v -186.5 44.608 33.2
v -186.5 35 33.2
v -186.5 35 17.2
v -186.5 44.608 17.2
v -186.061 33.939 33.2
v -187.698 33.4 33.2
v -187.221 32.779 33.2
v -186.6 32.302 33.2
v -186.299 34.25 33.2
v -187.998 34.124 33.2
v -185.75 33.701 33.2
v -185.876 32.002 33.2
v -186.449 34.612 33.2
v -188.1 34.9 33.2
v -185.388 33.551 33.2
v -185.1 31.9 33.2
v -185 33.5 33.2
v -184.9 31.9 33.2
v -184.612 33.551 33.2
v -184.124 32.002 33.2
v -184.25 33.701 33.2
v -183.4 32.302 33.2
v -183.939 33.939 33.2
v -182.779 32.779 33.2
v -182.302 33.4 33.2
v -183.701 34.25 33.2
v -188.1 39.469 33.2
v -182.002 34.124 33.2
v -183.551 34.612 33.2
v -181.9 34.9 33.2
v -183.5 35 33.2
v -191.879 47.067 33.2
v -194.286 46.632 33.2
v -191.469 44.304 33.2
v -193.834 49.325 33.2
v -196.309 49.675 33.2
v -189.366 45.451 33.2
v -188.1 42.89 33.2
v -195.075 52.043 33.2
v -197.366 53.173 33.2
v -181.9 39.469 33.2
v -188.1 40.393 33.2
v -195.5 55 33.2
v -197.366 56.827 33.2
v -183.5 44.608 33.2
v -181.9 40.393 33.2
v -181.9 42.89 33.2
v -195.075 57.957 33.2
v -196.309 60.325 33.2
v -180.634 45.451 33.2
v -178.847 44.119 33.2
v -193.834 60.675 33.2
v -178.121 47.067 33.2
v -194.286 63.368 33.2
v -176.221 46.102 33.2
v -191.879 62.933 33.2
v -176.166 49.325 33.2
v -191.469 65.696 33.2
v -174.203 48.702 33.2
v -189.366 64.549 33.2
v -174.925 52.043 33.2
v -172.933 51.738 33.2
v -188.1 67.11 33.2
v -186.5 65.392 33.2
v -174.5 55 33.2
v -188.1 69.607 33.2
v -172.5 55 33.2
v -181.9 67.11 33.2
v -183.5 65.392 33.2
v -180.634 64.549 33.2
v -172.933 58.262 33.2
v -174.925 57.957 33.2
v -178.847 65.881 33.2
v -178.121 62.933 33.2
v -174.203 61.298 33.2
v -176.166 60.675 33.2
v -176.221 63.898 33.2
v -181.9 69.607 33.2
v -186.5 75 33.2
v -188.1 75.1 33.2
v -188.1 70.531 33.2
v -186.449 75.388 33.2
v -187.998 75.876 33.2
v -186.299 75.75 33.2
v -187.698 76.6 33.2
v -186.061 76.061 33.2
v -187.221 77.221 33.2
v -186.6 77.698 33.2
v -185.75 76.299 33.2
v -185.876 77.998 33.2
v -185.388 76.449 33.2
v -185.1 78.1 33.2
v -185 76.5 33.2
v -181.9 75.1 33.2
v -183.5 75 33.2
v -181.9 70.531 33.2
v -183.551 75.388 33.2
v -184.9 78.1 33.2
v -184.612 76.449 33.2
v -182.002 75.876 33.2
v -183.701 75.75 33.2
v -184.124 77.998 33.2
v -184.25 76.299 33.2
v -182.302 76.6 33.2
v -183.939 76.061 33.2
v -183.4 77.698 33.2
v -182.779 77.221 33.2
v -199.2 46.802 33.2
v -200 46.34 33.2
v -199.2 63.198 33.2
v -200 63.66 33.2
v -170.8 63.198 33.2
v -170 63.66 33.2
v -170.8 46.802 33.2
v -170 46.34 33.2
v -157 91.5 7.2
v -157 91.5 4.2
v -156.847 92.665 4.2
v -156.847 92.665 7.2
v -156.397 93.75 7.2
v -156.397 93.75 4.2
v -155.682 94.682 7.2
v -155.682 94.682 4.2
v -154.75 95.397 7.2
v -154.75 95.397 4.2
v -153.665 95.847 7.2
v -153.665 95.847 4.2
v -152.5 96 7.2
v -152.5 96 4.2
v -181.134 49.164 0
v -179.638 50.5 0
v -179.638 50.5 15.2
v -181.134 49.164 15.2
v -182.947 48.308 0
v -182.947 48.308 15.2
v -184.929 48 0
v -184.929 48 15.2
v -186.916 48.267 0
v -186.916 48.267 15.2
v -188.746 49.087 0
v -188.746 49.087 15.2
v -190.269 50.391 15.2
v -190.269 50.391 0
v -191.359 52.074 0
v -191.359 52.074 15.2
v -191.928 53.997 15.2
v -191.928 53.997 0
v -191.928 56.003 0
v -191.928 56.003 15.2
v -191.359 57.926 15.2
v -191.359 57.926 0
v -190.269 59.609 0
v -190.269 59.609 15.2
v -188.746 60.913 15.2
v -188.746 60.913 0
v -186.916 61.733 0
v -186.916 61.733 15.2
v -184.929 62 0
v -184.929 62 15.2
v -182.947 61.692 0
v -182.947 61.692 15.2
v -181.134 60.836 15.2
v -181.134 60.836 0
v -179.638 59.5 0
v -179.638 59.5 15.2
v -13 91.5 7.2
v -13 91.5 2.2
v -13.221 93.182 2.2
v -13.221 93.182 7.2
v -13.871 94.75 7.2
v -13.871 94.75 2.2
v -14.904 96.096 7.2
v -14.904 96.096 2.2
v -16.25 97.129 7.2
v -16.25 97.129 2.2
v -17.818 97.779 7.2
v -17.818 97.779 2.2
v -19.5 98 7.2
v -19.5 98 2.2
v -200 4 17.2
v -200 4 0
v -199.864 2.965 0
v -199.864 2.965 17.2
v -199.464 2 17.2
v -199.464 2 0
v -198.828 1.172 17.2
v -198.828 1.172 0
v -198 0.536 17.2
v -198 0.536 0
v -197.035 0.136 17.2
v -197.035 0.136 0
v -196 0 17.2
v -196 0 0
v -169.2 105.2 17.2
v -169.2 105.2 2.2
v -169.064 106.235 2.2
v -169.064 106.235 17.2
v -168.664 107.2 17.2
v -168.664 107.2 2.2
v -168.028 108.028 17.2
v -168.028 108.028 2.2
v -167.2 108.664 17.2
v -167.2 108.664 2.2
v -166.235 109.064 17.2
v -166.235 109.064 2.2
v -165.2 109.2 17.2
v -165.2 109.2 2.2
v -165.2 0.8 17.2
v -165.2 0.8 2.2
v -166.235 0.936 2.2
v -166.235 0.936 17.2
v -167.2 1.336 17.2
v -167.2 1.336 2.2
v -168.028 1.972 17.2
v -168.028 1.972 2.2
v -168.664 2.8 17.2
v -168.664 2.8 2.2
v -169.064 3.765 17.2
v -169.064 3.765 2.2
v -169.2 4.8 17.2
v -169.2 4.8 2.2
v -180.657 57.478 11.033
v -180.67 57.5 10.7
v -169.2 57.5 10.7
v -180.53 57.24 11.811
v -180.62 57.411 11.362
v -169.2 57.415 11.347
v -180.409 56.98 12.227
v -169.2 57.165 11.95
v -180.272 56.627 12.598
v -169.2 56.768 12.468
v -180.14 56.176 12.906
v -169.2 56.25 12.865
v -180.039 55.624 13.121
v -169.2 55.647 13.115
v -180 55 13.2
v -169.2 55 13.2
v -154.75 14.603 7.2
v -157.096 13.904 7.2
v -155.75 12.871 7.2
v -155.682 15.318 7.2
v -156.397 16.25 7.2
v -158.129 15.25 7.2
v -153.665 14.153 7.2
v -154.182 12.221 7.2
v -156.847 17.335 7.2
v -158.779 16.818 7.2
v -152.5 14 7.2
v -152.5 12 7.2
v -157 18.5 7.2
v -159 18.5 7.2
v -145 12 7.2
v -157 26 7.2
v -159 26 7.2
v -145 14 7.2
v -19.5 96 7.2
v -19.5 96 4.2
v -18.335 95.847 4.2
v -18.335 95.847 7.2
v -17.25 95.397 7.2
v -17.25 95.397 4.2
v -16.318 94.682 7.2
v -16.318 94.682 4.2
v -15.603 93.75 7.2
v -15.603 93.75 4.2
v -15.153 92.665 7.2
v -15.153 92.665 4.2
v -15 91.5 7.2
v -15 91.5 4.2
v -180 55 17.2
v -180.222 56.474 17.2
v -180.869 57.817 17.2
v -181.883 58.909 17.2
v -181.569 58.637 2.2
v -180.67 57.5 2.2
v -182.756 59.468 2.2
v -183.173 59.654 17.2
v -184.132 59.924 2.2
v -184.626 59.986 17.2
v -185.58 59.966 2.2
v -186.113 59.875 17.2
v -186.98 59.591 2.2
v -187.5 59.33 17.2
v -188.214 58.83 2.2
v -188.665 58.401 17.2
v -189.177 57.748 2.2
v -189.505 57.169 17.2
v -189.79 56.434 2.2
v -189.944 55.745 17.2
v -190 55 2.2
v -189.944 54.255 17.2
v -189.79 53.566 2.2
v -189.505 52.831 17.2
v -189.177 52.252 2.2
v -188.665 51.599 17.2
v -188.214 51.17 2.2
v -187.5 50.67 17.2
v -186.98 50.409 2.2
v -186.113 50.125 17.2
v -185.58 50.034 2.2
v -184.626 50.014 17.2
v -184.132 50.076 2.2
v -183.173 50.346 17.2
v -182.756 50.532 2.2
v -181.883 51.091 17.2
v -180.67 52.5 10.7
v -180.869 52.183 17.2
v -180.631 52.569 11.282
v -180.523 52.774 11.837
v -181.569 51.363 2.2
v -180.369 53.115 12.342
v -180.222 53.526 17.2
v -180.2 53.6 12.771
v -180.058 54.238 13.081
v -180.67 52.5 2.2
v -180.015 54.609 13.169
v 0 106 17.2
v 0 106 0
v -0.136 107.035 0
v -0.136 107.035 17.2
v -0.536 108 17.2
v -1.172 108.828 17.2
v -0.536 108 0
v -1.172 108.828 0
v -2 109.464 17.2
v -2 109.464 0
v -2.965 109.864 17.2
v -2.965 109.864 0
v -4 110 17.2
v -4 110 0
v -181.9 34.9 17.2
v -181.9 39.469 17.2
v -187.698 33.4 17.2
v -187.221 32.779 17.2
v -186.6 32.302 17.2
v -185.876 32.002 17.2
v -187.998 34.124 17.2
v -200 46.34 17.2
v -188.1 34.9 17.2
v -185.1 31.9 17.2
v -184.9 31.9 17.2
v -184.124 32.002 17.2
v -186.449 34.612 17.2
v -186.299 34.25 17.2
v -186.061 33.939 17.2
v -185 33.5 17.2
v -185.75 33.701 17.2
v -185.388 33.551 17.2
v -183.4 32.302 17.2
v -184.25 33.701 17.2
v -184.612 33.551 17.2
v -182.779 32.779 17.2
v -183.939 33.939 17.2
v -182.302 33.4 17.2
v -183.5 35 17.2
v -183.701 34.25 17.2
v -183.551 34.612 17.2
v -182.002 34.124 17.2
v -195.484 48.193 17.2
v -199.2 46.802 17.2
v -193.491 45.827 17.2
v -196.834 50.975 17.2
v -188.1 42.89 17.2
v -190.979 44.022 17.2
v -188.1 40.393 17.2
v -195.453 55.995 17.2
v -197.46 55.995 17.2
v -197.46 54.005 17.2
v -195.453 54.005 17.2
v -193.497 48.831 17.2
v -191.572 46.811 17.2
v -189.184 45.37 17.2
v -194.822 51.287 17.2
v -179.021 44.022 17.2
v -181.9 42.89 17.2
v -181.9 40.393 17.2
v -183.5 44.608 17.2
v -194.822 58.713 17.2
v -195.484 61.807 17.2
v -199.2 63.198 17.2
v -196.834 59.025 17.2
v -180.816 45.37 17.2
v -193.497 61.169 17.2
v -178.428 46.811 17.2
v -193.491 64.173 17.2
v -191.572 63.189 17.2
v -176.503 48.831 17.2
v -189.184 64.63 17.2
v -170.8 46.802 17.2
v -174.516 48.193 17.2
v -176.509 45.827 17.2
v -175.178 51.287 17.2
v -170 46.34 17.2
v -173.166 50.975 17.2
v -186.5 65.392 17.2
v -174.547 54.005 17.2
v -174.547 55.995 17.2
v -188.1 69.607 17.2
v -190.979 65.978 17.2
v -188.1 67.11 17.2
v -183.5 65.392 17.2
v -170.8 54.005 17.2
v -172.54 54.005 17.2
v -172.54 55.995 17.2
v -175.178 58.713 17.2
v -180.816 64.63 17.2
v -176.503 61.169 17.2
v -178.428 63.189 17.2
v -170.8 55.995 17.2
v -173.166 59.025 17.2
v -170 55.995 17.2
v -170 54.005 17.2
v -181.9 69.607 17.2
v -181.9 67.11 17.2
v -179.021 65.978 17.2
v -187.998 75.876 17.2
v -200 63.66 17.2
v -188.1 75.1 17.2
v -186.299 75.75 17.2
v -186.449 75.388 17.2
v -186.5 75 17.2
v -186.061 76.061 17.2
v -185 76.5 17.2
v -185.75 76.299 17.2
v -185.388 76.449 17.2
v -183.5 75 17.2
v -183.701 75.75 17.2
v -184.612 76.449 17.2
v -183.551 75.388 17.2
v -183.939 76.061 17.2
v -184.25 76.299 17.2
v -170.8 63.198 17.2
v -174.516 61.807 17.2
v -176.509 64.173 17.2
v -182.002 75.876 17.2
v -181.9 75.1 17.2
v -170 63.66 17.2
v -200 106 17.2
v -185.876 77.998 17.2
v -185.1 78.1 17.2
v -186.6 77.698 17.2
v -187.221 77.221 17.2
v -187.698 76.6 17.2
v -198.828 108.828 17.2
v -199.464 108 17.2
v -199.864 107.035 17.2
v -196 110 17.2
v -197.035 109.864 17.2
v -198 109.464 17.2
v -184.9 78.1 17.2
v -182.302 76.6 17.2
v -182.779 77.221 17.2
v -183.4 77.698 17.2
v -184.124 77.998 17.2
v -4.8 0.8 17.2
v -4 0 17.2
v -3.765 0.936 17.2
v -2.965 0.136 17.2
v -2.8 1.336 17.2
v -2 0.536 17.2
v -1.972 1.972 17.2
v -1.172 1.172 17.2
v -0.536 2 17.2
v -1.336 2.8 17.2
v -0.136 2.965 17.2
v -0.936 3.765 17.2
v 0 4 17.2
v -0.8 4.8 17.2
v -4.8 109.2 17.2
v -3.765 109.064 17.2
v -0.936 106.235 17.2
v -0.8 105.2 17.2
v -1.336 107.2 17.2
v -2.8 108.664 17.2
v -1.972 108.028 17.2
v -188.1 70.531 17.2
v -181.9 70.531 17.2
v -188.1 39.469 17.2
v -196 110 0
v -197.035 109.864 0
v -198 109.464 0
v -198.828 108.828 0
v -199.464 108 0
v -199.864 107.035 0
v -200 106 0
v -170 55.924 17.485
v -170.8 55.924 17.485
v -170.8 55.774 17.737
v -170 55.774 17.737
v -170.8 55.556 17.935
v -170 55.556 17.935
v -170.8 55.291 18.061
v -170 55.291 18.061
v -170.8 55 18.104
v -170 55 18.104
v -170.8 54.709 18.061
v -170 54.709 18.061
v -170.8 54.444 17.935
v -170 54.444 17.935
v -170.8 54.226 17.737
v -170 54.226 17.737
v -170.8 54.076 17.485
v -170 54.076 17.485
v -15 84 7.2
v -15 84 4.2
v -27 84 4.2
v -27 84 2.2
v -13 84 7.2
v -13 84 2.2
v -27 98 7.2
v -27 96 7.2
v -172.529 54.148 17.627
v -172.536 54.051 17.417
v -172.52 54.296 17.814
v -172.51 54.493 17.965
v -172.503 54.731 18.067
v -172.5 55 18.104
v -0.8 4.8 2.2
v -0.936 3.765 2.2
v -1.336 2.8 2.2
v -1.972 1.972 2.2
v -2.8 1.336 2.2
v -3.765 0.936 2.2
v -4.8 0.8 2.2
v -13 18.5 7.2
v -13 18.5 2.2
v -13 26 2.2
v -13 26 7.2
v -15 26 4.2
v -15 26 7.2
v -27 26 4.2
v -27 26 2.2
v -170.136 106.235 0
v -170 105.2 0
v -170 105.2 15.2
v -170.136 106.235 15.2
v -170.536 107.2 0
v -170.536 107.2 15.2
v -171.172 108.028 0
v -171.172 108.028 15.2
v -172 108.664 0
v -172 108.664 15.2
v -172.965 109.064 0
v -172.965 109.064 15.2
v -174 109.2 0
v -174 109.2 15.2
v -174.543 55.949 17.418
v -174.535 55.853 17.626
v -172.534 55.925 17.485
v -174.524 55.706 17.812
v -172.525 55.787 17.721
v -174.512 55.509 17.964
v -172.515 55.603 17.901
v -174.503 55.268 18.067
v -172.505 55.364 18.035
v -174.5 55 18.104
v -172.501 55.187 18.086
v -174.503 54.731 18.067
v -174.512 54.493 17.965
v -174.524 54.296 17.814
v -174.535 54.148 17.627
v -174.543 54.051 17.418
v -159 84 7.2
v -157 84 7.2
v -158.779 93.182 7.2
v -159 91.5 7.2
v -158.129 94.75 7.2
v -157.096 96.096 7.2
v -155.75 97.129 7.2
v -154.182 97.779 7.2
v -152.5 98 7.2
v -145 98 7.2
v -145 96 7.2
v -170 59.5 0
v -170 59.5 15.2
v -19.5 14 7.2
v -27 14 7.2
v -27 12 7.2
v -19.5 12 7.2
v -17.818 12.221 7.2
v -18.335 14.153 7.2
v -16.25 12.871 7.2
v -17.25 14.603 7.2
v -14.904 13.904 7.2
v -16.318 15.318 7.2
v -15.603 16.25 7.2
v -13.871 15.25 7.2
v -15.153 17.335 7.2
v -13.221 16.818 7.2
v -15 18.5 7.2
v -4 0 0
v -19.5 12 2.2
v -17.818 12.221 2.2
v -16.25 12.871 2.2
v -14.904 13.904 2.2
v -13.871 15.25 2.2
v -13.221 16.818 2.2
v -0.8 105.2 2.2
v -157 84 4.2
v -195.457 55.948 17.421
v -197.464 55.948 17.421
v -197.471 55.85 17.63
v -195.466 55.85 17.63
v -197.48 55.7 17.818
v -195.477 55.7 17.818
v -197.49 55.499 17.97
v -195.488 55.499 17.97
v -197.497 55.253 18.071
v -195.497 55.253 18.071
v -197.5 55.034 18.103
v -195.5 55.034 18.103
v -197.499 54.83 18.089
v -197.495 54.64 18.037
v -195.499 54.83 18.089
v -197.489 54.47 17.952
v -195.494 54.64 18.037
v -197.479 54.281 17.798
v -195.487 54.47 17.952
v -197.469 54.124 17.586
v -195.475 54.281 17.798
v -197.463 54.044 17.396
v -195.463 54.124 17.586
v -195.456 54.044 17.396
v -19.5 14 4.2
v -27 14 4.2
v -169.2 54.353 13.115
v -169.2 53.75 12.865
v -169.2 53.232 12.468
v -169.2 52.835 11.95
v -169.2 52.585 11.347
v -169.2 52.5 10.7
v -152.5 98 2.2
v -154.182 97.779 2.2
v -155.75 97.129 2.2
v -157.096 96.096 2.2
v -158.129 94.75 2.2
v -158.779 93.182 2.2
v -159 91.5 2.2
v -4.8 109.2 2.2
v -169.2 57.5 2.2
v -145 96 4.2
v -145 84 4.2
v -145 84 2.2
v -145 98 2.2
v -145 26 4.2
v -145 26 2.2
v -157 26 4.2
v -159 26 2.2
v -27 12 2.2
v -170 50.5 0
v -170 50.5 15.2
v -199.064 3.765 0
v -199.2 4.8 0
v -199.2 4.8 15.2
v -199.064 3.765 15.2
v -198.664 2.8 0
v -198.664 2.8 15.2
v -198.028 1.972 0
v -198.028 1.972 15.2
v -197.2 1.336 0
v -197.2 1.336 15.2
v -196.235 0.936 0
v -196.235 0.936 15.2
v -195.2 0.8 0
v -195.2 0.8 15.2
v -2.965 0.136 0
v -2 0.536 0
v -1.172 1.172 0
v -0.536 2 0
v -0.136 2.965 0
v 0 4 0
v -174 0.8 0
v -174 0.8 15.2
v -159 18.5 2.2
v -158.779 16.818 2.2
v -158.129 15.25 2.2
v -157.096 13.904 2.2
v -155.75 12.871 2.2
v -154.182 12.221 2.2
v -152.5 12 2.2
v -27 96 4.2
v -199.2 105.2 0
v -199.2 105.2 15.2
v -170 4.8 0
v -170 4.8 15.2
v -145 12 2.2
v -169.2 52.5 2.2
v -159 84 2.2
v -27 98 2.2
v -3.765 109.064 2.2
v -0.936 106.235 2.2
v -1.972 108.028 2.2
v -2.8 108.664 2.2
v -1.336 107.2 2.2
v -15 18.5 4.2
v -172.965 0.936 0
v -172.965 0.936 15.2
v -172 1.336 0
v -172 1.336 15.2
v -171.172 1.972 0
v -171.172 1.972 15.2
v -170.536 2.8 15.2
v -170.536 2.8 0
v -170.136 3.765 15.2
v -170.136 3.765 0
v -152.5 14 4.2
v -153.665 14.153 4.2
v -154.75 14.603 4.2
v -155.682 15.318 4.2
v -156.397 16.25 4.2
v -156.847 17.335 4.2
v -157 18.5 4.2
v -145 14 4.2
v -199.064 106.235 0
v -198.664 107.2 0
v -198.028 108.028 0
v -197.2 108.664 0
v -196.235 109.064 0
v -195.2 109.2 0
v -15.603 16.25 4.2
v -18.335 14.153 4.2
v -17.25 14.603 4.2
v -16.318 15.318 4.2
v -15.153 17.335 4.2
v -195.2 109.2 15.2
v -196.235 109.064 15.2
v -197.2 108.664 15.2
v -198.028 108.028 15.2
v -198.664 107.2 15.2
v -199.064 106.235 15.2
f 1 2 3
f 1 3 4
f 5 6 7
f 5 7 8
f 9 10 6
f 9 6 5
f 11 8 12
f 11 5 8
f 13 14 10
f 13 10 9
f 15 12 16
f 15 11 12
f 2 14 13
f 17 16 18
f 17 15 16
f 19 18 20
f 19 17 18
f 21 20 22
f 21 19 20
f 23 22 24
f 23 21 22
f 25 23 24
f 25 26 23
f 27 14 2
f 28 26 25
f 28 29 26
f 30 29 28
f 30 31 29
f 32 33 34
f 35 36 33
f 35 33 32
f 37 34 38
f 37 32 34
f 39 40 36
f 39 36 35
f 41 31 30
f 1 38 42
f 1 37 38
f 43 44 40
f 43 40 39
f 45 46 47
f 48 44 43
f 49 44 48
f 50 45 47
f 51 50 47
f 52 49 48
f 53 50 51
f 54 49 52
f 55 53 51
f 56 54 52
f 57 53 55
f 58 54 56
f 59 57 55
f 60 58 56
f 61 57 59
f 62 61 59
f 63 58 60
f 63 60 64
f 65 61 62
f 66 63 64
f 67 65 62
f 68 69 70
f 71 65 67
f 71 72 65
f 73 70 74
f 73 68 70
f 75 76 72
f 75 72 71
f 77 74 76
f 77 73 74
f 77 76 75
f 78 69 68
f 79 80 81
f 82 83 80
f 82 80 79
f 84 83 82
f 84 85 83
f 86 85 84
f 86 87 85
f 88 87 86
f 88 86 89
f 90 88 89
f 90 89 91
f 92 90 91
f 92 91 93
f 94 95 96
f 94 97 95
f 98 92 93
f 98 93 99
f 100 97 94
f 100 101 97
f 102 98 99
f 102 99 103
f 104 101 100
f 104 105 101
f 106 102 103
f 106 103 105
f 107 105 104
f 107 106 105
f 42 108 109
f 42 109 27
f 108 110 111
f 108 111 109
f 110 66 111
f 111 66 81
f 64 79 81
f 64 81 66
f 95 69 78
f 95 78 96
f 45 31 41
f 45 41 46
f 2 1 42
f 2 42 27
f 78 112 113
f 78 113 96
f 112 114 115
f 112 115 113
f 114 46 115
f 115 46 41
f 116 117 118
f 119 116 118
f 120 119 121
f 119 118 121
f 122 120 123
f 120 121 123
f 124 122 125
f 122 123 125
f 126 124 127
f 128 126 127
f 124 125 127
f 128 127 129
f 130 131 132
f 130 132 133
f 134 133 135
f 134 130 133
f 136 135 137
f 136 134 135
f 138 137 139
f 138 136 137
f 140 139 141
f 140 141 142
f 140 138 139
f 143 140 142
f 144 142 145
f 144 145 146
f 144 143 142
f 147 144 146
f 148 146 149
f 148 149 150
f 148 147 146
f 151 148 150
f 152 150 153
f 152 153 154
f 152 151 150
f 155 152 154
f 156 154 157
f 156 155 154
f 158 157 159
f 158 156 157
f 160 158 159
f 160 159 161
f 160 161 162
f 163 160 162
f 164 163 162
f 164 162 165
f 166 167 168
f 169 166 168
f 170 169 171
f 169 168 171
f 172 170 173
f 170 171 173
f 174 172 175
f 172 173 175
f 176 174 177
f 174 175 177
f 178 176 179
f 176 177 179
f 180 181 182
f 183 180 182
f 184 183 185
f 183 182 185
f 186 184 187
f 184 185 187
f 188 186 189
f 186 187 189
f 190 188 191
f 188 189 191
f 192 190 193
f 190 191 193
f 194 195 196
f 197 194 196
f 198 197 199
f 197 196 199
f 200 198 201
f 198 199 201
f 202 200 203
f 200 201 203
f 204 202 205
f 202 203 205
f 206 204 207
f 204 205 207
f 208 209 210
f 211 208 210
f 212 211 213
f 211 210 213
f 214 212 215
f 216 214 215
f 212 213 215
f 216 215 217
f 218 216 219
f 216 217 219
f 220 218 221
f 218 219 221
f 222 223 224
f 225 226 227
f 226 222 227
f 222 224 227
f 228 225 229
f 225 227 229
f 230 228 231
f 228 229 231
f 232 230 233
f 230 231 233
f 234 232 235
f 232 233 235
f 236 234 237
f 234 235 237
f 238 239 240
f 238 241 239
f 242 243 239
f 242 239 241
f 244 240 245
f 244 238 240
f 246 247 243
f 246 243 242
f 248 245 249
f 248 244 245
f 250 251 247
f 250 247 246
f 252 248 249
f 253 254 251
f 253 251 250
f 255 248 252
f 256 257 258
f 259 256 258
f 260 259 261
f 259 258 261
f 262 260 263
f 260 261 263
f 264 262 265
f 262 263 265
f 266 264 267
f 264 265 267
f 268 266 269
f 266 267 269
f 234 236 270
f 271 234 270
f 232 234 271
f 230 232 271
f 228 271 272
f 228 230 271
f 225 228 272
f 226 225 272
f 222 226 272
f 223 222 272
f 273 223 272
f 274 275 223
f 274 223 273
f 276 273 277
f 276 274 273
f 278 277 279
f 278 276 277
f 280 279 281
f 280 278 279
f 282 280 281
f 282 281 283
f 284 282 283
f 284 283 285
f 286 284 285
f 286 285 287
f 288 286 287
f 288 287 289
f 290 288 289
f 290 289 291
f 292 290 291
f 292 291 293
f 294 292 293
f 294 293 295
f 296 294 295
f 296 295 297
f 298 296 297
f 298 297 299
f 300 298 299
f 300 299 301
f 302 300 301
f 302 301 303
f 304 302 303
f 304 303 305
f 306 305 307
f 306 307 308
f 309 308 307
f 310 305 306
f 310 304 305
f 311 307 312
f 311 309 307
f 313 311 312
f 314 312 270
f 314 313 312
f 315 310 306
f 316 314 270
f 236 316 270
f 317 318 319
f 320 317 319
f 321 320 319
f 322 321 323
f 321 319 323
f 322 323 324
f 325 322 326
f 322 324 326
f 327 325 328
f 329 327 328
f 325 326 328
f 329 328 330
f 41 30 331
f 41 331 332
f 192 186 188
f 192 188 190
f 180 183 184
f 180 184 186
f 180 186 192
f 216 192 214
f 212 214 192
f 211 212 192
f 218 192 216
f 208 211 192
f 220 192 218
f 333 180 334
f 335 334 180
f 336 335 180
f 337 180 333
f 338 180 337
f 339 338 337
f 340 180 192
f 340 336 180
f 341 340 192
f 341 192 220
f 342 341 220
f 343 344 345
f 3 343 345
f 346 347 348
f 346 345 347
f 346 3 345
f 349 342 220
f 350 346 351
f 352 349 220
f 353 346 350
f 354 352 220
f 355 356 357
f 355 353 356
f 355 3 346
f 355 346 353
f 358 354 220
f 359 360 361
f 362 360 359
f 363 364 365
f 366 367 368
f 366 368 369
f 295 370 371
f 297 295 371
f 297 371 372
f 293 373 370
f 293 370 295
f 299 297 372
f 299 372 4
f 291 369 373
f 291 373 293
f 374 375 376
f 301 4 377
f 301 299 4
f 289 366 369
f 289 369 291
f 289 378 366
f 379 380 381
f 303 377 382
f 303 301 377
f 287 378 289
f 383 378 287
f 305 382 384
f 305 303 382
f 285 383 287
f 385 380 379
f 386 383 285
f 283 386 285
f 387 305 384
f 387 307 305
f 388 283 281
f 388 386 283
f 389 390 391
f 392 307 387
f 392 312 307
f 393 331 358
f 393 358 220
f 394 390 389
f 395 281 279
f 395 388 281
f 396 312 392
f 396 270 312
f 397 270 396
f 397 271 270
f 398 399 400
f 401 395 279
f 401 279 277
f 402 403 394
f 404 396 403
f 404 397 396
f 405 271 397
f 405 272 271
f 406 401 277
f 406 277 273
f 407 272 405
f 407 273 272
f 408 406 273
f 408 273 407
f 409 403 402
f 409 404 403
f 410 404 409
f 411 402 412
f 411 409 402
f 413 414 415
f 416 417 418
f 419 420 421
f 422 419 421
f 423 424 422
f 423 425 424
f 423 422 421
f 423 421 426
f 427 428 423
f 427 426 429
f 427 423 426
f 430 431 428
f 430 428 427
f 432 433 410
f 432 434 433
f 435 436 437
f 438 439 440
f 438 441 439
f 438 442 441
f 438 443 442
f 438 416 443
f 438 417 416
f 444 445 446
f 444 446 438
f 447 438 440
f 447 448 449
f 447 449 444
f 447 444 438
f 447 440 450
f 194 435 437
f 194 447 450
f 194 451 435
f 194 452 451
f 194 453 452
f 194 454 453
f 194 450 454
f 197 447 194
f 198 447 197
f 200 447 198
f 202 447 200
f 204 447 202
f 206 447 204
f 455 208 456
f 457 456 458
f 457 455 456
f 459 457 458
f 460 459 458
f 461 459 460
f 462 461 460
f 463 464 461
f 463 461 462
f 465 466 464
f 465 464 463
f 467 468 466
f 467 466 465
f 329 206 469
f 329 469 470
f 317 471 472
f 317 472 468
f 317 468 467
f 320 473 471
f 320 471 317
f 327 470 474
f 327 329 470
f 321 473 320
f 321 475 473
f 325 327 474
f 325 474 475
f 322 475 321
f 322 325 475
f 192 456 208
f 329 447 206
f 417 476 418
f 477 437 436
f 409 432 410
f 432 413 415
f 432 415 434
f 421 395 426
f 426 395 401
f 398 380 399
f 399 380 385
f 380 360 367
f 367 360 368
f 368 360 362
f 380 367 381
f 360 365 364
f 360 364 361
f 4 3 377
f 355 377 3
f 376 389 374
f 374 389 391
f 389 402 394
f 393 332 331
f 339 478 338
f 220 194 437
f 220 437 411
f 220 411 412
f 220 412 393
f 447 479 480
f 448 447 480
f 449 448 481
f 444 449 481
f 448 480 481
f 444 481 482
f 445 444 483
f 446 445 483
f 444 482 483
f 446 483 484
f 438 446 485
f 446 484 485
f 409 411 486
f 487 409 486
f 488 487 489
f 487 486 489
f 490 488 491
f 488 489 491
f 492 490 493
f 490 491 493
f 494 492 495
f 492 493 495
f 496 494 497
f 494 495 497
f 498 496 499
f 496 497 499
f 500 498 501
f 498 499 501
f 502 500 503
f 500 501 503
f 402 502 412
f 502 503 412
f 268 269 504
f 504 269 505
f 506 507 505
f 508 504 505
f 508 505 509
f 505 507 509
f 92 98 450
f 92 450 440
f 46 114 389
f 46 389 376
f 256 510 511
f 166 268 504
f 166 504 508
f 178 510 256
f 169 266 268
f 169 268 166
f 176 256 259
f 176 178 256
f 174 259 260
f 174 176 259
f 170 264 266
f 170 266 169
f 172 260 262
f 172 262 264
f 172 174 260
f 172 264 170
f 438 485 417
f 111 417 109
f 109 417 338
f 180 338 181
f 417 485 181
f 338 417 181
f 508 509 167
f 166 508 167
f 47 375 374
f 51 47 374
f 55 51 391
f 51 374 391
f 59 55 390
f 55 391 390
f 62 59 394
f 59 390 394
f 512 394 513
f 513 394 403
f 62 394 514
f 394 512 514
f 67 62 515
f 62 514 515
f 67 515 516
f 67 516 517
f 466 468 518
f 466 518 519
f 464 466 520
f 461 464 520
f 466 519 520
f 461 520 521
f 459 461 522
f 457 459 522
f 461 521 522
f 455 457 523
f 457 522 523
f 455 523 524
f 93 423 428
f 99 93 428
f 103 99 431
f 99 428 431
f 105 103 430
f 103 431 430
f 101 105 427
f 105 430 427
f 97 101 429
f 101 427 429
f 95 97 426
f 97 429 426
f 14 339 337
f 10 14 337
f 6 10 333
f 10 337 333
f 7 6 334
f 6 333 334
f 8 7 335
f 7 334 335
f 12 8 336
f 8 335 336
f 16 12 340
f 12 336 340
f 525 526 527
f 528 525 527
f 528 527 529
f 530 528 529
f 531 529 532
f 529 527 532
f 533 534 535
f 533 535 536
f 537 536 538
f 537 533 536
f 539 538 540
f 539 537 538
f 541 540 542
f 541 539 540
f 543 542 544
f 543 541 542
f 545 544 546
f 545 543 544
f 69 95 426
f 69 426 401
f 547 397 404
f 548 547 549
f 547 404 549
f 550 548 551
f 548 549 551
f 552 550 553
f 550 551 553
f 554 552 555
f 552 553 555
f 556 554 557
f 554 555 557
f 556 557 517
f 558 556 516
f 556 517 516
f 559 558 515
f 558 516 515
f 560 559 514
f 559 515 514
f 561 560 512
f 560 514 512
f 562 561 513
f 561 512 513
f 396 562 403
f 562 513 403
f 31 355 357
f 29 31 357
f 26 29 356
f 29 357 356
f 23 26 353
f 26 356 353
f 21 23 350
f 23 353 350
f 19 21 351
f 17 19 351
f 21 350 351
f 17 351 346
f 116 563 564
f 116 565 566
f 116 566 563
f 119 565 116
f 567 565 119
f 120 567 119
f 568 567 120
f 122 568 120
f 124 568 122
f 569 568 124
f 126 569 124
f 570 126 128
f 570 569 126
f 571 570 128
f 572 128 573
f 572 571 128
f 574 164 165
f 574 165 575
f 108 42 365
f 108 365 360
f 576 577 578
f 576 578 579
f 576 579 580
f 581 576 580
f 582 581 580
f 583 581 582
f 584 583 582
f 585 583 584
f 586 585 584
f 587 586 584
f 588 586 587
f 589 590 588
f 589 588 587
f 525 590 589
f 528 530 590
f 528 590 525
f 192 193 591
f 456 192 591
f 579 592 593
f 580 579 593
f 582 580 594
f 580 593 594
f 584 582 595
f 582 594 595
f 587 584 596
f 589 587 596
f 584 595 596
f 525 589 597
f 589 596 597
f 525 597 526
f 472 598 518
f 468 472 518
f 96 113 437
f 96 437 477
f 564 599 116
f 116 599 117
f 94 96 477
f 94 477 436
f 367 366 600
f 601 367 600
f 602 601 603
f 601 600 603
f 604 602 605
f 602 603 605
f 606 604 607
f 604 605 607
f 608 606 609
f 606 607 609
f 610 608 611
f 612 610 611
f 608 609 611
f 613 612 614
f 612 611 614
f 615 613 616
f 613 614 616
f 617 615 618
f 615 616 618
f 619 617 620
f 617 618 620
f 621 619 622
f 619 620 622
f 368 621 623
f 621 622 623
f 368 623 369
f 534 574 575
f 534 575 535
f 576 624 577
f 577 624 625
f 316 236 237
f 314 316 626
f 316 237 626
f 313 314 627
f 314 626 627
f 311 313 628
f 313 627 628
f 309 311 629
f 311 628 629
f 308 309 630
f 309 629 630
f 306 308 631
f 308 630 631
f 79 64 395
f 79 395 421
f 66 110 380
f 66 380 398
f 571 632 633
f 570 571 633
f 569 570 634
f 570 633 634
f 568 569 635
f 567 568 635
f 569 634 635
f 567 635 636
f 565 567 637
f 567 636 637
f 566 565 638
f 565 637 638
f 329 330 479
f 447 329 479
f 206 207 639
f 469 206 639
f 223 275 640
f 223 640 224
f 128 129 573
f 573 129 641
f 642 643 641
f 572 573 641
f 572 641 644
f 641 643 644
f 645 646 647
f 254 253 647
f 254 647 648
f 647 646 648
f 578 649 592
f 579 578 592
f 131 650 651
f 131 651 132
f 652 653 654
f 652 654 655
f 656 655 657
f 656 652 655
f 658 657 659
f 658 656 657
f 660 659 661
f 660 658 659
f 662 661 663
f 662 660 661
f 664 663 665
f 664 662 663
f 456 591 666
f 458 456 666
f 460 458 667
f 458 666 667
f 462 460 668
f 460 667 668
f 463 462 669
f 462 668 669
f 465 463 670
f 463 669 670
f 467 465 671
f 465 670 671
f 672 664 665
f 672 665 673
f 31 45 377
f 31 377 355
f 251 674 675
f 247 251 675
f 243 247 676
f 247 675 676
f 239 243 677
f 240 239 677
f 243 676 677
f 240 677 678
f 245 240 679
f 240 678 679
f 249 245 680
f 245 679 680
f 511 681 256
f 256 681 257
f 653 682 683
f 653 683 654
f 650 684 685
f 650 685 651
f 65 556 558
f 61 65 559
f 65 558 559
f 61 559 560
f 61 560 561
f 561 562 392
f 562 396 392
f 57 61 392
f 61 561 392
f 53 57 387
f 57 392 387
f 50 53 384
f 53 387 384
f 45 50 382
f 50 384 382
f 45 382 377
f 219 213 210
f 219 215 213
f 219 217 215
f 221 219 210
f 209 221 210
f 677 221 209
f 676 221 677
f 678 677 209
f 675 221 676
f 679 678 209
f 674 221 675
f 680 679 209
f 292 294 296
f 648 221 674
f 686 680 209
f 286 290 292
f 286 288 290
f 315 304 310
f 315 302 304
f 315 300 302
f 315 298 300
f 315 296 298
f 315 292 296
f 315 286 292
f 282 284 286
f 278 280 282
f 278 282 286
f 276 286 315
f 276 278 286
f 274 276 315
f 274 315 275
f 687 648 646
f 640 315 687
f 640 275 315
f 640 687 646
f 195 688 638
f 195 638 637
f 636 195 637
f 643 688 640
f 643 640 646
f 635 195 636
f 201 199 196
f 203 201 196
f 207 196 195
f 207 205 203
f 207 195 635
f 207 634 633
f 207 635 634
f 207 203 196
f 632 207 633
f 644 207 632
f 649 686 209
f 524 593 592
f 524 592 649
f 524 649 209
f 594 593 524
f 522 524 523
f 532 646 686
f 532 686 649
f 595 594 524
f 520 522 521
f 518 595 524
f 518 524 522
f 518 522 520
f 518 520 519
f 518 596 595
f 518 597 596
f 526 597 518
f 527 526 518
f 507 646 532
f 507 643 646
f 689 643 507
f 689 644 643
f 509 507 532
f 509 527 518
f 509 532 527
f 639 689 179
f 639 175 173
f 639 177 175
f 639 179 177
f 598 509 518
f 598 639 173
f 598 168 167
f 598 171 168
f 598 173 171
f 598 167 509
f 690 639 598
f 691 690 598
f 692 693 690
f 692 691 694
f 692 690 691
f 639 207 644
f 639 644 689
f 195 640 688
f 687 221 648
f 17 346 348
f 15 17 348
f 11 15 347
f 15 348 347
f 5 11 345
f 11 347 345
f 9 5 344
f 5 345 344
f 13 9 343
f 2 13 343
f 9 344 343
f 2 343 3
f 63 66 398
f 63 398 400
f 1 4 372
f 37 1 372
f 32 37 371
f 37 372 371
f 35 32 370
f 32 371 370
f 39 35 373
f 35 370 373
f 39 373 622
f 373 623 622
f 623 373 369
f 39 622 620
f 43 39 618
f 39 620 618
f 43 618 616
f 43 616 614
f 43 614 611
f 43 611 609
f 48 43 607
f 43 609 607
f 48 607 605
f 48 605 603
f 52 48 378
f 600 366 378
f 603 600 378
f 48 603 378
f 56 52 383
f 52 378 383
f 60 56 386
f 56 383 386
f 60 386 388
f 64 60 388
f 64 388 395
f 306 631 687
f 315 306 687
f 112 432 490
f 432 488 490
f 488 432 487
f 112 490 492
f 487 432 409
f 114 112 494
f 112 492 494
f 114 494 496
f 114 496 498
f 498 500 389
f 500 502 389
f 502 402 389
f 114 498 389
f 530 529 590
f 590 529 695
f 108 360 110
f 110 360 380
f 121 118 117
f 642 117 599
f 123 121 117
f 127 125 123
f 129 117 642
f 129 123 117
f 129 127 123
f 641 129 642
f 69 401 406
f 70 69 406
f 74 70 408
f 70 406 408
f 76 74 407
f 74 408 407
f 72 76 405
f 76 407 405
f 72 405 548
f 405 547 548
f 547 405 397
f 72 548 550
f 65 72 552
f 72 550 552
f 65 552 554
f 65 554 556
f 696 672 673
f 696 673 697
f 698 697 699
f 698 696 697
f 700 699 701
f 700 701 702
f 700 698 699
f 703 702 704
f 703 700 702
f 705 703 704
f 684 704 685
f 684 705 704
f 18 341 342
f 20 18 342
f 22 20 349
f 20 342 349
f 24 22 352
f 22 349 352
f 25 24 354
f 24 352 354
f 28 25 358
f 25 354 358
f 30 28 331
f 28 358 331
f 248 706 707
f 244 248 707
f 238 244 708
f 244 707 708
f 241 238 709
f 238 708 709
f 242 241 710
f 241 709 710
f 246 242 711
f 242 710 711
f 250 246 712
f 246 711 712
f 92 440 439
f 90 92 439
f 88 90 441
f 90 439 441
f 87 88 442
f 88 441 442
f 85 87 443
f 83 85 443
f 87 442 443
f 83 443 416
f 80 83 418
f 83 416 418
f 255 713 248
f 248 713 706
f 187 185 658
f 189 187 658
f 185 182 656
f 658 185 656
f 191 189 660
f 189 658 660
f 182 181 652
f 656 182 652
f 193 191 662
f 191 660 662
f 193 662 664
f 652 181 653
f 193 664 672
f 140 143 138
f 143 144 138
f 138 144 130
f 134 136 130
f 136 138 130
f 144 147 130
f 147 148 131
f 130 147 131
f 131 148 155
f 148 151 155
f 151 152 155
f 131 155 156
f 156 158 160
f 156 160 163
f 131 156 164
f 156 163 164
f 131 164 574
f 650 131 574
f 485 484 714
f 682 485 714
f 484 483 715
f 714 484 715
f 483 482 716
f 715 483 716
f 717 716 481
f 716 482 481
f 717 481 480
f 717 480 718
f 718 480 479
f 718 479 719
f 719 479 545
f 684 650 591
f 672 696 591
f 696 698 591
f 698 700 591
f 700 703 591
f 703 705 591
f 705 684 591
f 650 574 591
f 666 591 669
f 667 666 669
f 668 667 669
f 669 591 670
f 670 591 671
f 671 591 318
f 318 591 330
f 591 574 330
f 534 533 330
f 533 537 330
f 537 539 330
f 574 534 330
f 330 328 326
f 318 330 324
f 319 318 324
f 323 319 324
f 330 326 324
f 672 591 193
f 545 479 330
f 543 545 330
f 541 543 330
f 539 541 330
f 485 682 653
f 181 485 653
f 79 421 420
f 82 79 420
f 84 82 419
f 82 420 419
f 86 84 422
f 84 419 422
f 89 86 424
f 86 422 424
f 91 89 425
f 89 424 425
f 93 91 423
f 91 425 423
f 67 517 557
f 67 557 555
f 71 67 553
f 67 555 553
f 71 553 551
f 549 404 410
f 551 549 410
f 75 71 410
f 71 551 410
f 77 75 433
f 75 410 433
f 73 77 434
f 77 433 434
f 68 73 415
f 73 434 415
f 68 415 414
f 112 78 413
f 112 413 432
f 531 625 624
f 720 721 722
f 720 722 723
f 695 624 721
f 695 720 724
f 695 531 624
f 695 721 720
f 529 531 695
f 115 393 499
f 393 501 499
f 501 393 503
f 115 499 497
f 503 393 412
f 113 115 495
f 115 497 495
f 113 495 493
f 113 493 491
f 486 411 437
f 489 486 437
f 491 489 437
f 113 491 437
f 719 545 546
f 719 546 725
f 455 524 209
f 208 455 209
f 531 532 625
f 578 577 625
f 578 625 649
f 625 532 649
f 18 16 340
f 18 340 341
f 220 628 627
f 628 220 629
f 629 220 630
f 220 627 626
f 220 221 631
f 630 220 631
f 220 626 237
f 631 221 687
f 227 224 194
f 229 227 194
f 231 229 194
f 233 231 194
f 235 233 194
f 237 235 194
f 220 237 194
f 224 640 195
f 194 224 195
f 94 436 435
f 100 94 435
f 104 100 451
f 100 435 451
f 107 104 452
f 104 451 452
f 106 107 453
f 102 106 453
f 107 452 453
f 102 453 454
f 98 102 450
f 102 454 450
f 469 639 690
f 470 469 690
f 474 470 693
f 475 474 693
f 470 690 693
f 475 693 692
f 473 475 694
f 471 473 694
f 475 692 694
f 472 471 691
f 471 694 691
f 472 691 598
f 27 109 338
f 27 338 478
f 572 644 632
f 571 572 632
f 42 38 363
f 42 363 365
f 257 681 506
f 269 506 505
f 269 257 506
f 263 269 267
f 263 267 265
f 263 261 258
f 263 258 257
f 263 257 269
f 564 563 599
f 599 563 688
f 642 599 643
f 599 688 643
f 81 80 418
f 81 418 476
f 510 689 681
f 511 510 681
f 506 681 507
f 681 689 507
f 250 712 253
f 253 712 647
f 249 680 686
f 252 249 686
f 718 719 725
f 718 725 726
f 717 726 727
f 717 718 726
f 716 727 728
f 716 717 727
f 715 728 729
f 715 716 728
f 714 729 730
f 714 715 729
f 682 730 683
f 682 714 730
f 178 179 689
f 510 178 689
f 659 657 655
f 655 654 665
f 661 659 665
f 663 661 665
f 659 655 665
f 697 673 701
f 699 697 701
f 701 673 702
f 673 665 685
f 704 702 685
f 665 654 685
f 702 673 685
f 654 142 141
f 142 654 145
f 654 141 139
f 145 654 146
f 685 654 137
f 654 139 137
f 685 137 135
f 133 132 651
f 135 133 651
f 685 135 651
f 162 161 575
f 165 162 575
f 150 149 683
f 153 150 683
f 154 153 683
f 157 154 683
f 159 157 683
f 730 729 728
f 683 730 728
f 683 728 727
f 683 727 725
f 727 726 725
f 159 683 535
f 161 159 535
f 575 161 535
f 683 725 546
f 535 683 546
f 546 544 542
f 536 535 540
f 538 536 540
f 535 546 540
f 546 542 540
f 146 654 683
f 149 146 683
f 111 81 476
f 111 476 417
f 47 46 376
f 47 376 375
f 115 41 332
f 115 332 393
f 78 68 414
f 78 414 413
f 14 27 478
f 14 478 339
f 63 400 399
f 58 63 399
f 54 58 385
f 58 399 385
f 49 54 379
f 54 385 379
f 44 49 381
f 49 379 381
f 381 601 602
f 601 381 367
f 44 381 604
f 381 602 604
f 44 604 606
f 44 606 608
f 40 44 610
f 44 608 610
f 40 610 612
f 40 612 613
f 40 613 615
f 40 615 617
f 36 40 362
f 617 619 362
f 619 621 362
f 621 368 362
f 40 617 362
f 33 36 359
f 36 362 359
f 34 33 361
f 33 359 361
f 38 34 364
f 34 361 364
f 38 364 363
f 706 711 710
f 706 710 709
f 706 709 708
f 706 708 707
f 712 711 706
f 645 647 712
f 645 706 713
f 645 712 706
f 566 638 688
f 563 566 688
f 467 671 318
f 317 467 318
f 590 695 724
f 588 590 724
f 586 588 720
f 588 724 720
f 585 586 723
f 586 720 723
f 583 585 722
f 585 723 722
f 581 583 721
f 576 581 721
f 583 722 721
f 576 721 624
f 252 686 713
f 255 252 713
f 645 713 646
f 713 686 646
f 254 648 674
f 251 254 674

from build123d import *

# Parameters (mm, degrees)
F0_R      = 5
F1_DEPTH  = 2.2
F2_DEPTH  = 17.2
F4_DEPTH  = 20
F5_DEPTH  = 15.2
F7_DEPTH  = 16
F9_DEPTH  = 2
F10_DEPTH = 5
F12_DEPTH = 16
F14_DEPTH = 28


with BuildPart() as f1:
    # F0 (on Top) → F1 (new body)
    with BuildSketch(Plane.XY):
        with BuildLine():
            Line((-196, 0), (-4, 0))
            ThreePointArc((-4, 0), (-1.1715728753, 1.1715728753), (0, 4))
            Line((0, 4), (0, 106))
            ThreePointArc((0, 106), (-1.1715728753, 108.8284271247), (-4, 110))
            Line((-4, 110), (-196, 110))
            ThreePointArc((-196, 110), (-198.8284271247, 108.8284271247), (-200, 106))
            Line((-200, 106), (-200, 4))
            ThreePointArc((-200, 4), (-198.8284271247, 1.1715728753), (-196, 0))
        make_face()
        with BuildLine():
            Line((-170, 105.2), (-170, 59.5))
            Line((-170, 59.5), (-170, 50.5))
            Line((-170, 50.5), (-170, 4.8))
            ThreePointArc((-170, 4.8), (-171.1715728753, 1.9715728753), (-174, 0.8))
            Line((-174, 0.8), (-195.2, 0.8))
            ThreePointArc((-195.2, 0.8), (-198.0284271247, 1.9715728753), (-199.2, 4.8))
            Line((-199.2, 4.8), (-199.2, 105.2))
            ThreePointArc((-199.2, 105.2), (-198.0284271247, 108.0284271247), (-195.2, 109.2))
            Line((-195.2, 109.2), (-174, 109.2))
            ThreePointArc((-174, 109.2), (-171.1715728753, 108.0284271247), (-170, 105.2))
        make_face(mode=Mode.SUBTRACT)
        with BuildLine():
            ThreePointArc((-4.8, 109.2), (-1.9715728753, 108.0284271247), (-0.8, 105.2))
            Line((-0.8, 105.2), (-0.8, 4.8))
            ThreePointArc((-0.8, 4.8), (-1.9715728753, 1.9715728753), (-4.8, 0.8))
            Line((-4.8, 0.8), (-165.2, 0.8))
            ThreePointArc((-165.2, 0.8), (-168.0284271247, 1.9715728753), (-169.2, 4.8))
            Line((-169.2, 4.8), (-169.2, 105.2))
            ThreePointArc((-169.2, 105.2), (-168.0284271247, 108.0284271247), (-165.2, 109.2))
            Line((-165.2, 109.2), (-4.8, 109.2))
        make_face(mode=Mode.SUBTRACT)
        with BuildLine():
            Line((-0.8, 4.8), (-0.8, 105.2))
            ThreePointArc((-0.8, 105.2), (-1.9715728753, 108.0284271247), (-4.8, 109.2))
            Line((-4.8, 109.2), (-165.2, 109.2))
            ThreePointArc((-165.2, 109.2), (-168.0284271247, 108.0284271247), (-169.2, 105.2))
            Line((-169.2, 105.2), (-169.2, 4.8))
            ThreePointArc((-169.2, 4.8), (-168.0284271247, 1.9715728753), (-165.2, 0.8))
            Line((-165.2, 0.8), (-4.8, 0.8))
            ThreePointArc((-4.8, 0.8), (-1.9715728753, 1.9715728753), (-0.8, 4.8))
        make_face()
        with BuildLine():
            ThreePointArc((-179.6380973526, 50.5), (-192, 55), (-179.6380973526, 59.5))
            Line((-179.6380973526, 59.5), (-170, 59.5))
            Line((-170, 59.5), (-170, 105.2))
            ThreePointArc((-170, 105.2), (-171.1715728753, 108.0284271247), (-174, 109.2))
            Line((-174, 109.2), (-195.2, 109.2))
            ThreePointArc((-195.2, 109.2), (-198.0284271247, 108.0284271247), (-199.2, 105.2))
            Line((-199.2, 105.2), (-199.2, 4.8))
            ThreePointArc((-199.2, 4.8), (-198.0284271247, 1.9715728753), (-195.2, 0.8))
            Line((-195.2, 0.8), (-174, 0.8))
            ThreePointArc((-174, 0.8), (-171.1715728753, 1.9715728753), (-170, 4.8))
            Line((-170, 4.8), (-170, 50.5))
            Line((-170, 50.5), (-179.6380973526, 50.5))
        make_face()
        with BuildLine():
            ThreePointArc((-179.6380973526, 50.5), (-178.4222603224, 52.6055604551), (-178, 55))
            ThreePointArc((-178, 55), (-178.4222603224, 57.3944395449), (-179.6380973526, 59.5))
            ThreePointArc((-179.6380973526, 59.5), (-192, 55), (-179.6380973526, 50.5))
        make_face()
        with Locations((-185, 55)):
            Circle(F0_R, mode=Mode.SUBTRACT)
        with Locations((-185, 55)):
            Circle(F0_R)
        with BuildLine():
            ThreePointArc((-179.6380973526, 59.5), (-178.4222603224, 57.3944395449), (-178, 55))
            ThreePointArc((-178, 55), (-178.4222603224, 52.6055604551), (-179.6380973526, 50.5))
            Line((-179.6380973526, 50.5), (-170, 50.5))
            Line((-170, 50.5), (-170, 59.5))
            Line((-170, 59.5), (-179.6380973526, 59.5))
        make_face()
    extrude(amount=F1_DEPTH)

    # F0 (on Top) → F2 (join)
    with BuildSketch(Plane.XY):
        with BuildLine():
            Line((-196, 0), (-4, 0))
            ThreePointArc((-4, 0), (-1.1715728753, 1.1715728753), (0, 4))
            Line((0, 4), (0, 106))
            ThreePointArc((0, 106), (-1.1715728753, 108.8284271247), (-4, 110))
            Line((-4, 110), (-196, 110))
            ThreePointArc((-196, 110), (-198.8284271247, 108.8284271247), (-200, 106))
            Line((-200, 106), (-200, 4))
            ThreePointArc((-200, 4), (-198.8284271247, 1.1715728753), (-196, 0))
        make_face()
        with BuildLine():
            Line((-170, 105.2), (-170, 59.5))
            Line((-170, 59.5), (-170, 50.5))
            Line((-170, 50.5), (-170, 4.8))
            ThreePointArc((-170, 4.8), (-171.1715728753, 1.9715728753), (-174, 0.8))
            Line((-174, 0.8), (-195.2, 0.8))
            ThreePointArc((-195.2, 0.8), (-198.0284271247, 1.9715728753), (-199.2, 4.8))
            Line((-199.2, 4.8), (-199.2, 105.2))
            ThreePointArc((-199.2, 105.2), (-198.0284271247, 108.0284271247), (-195.2, 109.2))
            Line((-195.2, 109.2), (-174, 109.2))
            ThreePointArc((-174, 109.2), (-171.1715728753, 108.0284271247), (-170, 105.2))
        make_face(mode=Mode.SUBTRACT)
        with BuildLine():
            ThreePointArc((-4.8, 109.2), (-1.9715728753, 108.0284271247), (-0.8, 105.2))
            Line((-0.8, 105.2), (-0.8, 4.8))
            ThreePointArc((-0.8, 4.8), (-1.9715728753, 1.9715728753), (-4.8, 0.8))
            Line((-4.8, 0.8), (-165.2, 0.8))
            ThreePointArc((-165.2, 0.8), (-168.0284271247, 1.9715728753), (-169.2, 4.8))
            Line((-169.2, 4.8), (-169.2, 105.2))
            ThreePointArc((-169.2, 105.2), (-168.0284271247, 108.0284271247), (-165.2, 109.2))
            Line((-165.2, 109.2), (-4.8, 109.2))
        make_face(mode=Mode.SUBTRACT)
        with BuildLine():
            ThreePointArc((-179.6380973526, 50.5), (-178.4222603224, 52.6055604551), (-178, 55))
            ThreePointArc((-178, 55), (-178.4222603224, 57.3944395449), (-179.6380973526, 59.5))
            ThreePointArc((-179.6380973526, 59.5), (-192, 55), (-179.6380973526, 50.5))
        make_face()
        with Locations((-185, 55)):
            Circle(F0_R, mode=Mode.SUBTRACT)
        with BuildLine():
            ThreePointArc((-179.6380973526, 50.5), (-192, 55), (-179.6380973526, 59.5))
            Line((-179.6380973526, 59.5), (-170, 59.5))
            Line((-170, 59.5), (-170, 105.2))
            ThreePointArc((-170, 105.2), (-171.1715728753, 108.0284271247), (-174, 109.2))
            Line((-174, 109.2), (-195.2, 109.2))
            ThreePointArc((-195.2, 109.2), (-198.0284271247, 108.0284271247), (-199.2, 105.2))
            Line((-199.2, 105.2), (-199.2, 4.8))
            ThreePointArc((-199.2, 4.8), (-198.0284271247, 1.9715728753), (-195.2, 0.8))
            Line((-195.2, 0.8), (-174, 0.8))
            ThreePointArc((-174, 0.8), (-171.1715728753, 1.9715728753), (-170, 4.8))
            Line((-170, 4.8), (-170, 50.5))
            Line((-170, 50.5), (-179.6380973526, 50.5))
        make_face()
        with BuildLine():
            ThreePointArc((-179.6380973526, 59.5), (-178.4222603224, 57.3944395449), (-178, 55))
            ThreePointArc((-178, 55), (-178.4222603224, 52.6055604551), (-179.6380973526, 50.5))
            Line((-179.6380973526, 50.5), (-170, 50.5))
            Line((-170, 50.5), (-170, 59.5))
            Line((-170, 59.5), (-179.6380973526, 59.5))
        make_face()
    extrude(amount=F2_DEPTH)

    # F3 (on face) → F4 (cut)
    with BuildSketch(Plane.YZ.offset(-169.2)):
        with BuildLine():
            Line((52.5, 2.2), (57.5, 2.2))
            Line((57.5, 2.2), (57.5, 10.7))
            ThreePointArc((57.5, 10.7), (56.767766953, 12.467766953), (55, 13.2))
            ThreePointArc((55, 13.2), (53.232233047, 12.467766953), (52.5, 10.7))
            Line((52.5, 10.7), (52.5, 2.2))
        make_face()
    extrude(amount=-F4_DEPTH, mode=Mode.SUBTRACT)

    # F0 (on Top) → F5 (cut)
    with BuildSketch(Plane.XY):
        with BuildLine():
            ThreePointArc((-179.6380973526, 50.5), (-192, 55), (-179.6380973526, 59.5))
            Line((-179.6380973526, 59.5), (-170, 59.5))
            Line((-170, 59.5), (-170, 105.2))
            ThreePointArc((-170, 105.2), (-171.1715728753, 108.0284271247), (-174, 109.2))
            Line((-174, 109.2), (-195.2, 109.2))
            ThreePointArc((-195.2, 109.2), (-198.0284271247, 108.0284271247), (-199.2, 105.2))
            Line((-199.2, 105.2), (-199.2, 4.8))
            ThreePointArc((-199.2, 4.8), (-198.0284271247, 1.9715728753), (-195.2, 0.8))
            Line((-195.2, 0.8), (-174, 0.8))
            ThreePointArc((-174, 0.8), (-171.1715728753, 1.9715728753), (-170, 4.8))
            Line((-170, 4.8), (-170, 50.5))
            Line((-170, 50.5), (-179.6380973526, 50.5))
        make_face()
    extrude(amount=F5_DEPTH, mode=Mode.SUBTRACT)

    # F6 (on face) → F7 (join)
    with BuildSketch(Plane.XY.offset(17.2)):
        with BuildLine():
            ThreePointArc((-186.5, 44.6076951546), (-195.5, 55), (-186.5, 65.3923048454))
            Line((-186.5, 65.3923048454), (-186.5, 67.409673646))
            ThreePointArc((-186.5, 67.409673646), (-187.3048917532, 67.2856613174), (-188.1, 67.1095004026))
            ThreePointArc((-188.1, 67.1095004026), (-197.5, 55), (-188.1, 42.8904995974))
            ThreePointArc((-188.1, 42.8904995974), (-187.3048917532, 42.7143386826), (-186.5, 42.590326354))
            Line((-186.5, 42.590326354), (-186.5, 44.6076951546))
        make_face()
        with BuildLine():
            Line((-183.5, 75), (-183.5, 67.409673646))
            ThreePointArc((-183.5, 67.409673646), (-182.6951082468, 67.2856613174), (-181.9, 67.1095004026))
            Line((-181.9, 67.1095004026), (-181.9, 75.1))
            ThreePointArc((-181.9, 75.1), (-182.7786796564, 77.2213203436), (-184.9, 78.1))
            Line((-184.9, 78.1), (-185.1, 78.1))
            ThreePointArc((-185.1, 78.1), (-187.2213203436, 77.2213203436), (-188.1, 75.1))
            Line((-188.1, 75.1), (-188.1, 67.1095004026))
            ThreePointArc((-188.1, 67.1095004026), (-187.3048917532, 67.2856613174), (-186.5, 67.409673646))
            Line((-186.5, 67.409673646), (-186.5, 75))
            ThreePointArc((-186.5, 75), (-186.0606601718, 76.0606601718), (-185, 76.5))
            ThreePointArc((-185, 76.5), (-183.9393398282, 76.0606601718), (-183.5, 75))
        make_face()
        with BuildLine():
            ThreePointArc((-183.5, 65.3923048454), (-177.0627460668, 61.8738635424), (-174.5, 55))
            ThreePointArc((-174.5, 55), (-177.0627460668, 48.1261364576), (-183.5, 44.6076951546))
            Line((-183.5, 44.6076951546), (-183.5, 42.590326354))
            ThreePointArc((-183.5, 42.590326354), (-182.6951082468, 42.7143386826), (-181.9, 42.8904995974))
            ThreePointArc((-181.9, 42.8904995974), (-175.1257911709, 47.3351451416), (-172.5, 55))
            ThreePointArc((-172.5, 55), (-175.1257911709, 62.6648548584), (-181.9, 67.1095004026))
            ThreePointArc((-181.9, 67.1095004026), (-182.6951082468, 67.2856613174), (-183.5, 67.409673646))
            Line((-183.5, 67.409673646), (-183.5, 65.3923048454))
        make_face()
        with BuildLine():
            ThreePointArc((-181.9, 42.8904995974), (-182.6951082468, 42.7143386826), (-183.5, 42.590326354))
            Line((-183.5, 42.590326354), (-183.5, 35))
            ThreePointArc((-183.5, 35), (-183.9393398282, 33.9393398282), (-185, 33.5))
            ThreePointArc((-185, 33.5), (-186.0606601718, 33.9393398282), (-186.5, 35))
            Line((-186.5, 35), (-186.5, 42.590326354))
            ThreePointArc((-186.5, 42.590326354), (-187.3048917532, 42.7143386826), (-188.1, 42.8904995974))
            Line((-188.1, 42.8904995974), (-188.1, 34.9))
            ThreePointArc((-188.1, 34.9), (-187.2213203436, 32.7786796564), (-185.1, 31.9))
            Line((-185.1, 31.9), (-184.9, 31.9))
            ThreePointArc((-184.9, 31.9), (-182.7786796564, 32.7786796564), (-181.9, 34.9))
            Line((-181.9, 34.9), (-181.9, 42.8904995974))
        make_face()
    extrude(amount=F7_DEPTH)

    # F8 (on face) → F9 (join)
    with BuildSketch(Plane.XY.offset(2.2)):
        with BuildLine():
            Line((-157, 84), (-145, 84))
            Line((-145, 84), (-145, 96))
            Line((-145, 96), (-152.5, 96))
            ThreePointArc((-152.5, 96), (-155.6819805153, 94.6819805153), (-157, 91.5))
            Line((-157, 91.5), (-157, 84))
        make_face()
        with BuildLine():
            Line((-19.5, 96), (-27, 96))
            Line((-27, 96), (-27, 84))
            Line((-27, 84), (-15, 84))
            Line((-15, 84), (-15, 91.5))
            ThreePointArc((-15, 91.5), (-16.3180194847, 94.6819805153), (-19.5, 96))
        make_face()
        with BuildLine():
            Line((-15, 26), (-27, 26))
            Line((-27, 26), (-27, 14))
            Line((-27, 14), (-19.5, 14))
            ThreePointArc((-19.5, 14), (-16.3180194847, 15.3180194847), (-15, 18.5))
            Line((-15, 18.5), (-15, 26))
        make_face()
        with BuildLine():
            Line((-145, 14), (-145, 26))
            Line((-145, 26), (-157, 26))
            Line((-157, 26), (-157, 18.5))
            ThreePointArc((-157, 18.5), (-155.6819805153, 15.3180194847), (-152.5, 14))
            Line((-152.5, 14), (-145, 14))
        make_face()
    extrude(amount=F9_DEPTH)

    # F8 (on face) → F10 (join)
    with BuildSketch(Plane.XY.offset(2.2)):
        with BuildLine():
            Line((-159, 84), (-157, 84))
            Line((-157, 84), (-157, 91.5))
            ThreePointArc((-157, 91.5), (-155.6819805153, 94.6819805153), (-152.5, 96))
            Line((-152.5, 96), (-145, 96))
            Line((-145, 96), (-145, 98))
            Line((-145, 98), (-152.5, 98))
            ThreePointArc((-152.5, 98), (-157.0961940777, 96.0961940777), (-159, 91.5))
            Line((-159, 91.5), (-159, 84))
        make_face()
        with BuildLine():
            Line((-157, 18.5), (-157, 26))
            Line((-157, 26), (-159, 26))
            Line((-159, 26), (-159, 18.5))
            ThreePointArc((-159, 18.5), (-157.0961940777, 13.9038059223), (-152.5, 12))
            Line((-152.5, 12), (-145, 12))
            Line((-145, 12), (-145, 14))
            Line((-145, 14), (-152.5, 14))
            ThreePointArc((-152.5, 14), (-155.6819805153, 15.3180194847), (-157, 18.5))
        make_face()
        with BuildLine():
            Line((-13, 26), (-15, 26))
            Line((-15, 26), (-15, 18.5))
            ThreePointArc((-15, 18.5), (-16.3180194847, 15.3180194847), (-19.5, 14))
            Line((-19.5, 14), (-27, 14))
            Line((-27, 14), (-27, 12))
            Line((-27, 12), (-19.5, 12))
            ThreePointArc((-19.5, 12), (-14.9038059223, 13.9038059223), (-13, 18.5))
            Line((-13, 18.5), (-13, 26))
        make_face()
        with BuildLine():
            Line((-27, 98), (-27, 96))
            Line((-27, 96), (-19.5, 96))
            ThreePointArc((-19.5, 96), (-16.3180194847, 94.6819805153), (-15, 91.5))
            Line((-15, 91.5), (-15, 84))
            Line((-15, 84), (-13, 84))
            Line((-13, 84), (-13, 91.5))
            ThreePointArc((-13, 91.5), (-14.9038059223, 96.0961940777), (-19.5, 98))
            Line((-19.5, 98), (-27, 98))
        make_face()
    extrude(amount=F10_DEPTH)

    # F11 (on face) → F12 (join)
    with BuildSketch(Plane.XY.offset(17.2)):
        Polygon((-200, 63.6602540378), (-200, 46.3397459622), (-188.1, 39.4692777588), (-188.1, 40.3930381895), (-199.2, 46.8016261775), (-199.2, 63.1983738225), (-188.1, 69.6069618105), (-188.1, 70.5307222412), align=None)
        Polygon((-181.9, 40.3930381895), (-181.9, 39.4692777588), (-170, 46.3397459622), (-170, 63.6602540378), (-181.9, 70.5307222412), (-181.9, 69.6069618105), (-170.8, 63.1983738225), (-170.8, 46.8016261775), align=None)
    extrude(amount=F12_DEPTH)

    # F13 (on face) → F14 (cut)
    with BuildSketch(Plane.YZ.offset(-170)):
        with BuildLine():
            Line((54.0046448451, 17.2), (55.9953551549, 17.2))
            ThreePointArc((55.9953551549, 17.2), (55, 18.1037289471), (54.0046448451, 17.2))
        make_face()
    extrude(amount=-F14_DEPTH, mode=Mode.SUBTRACT)


solid = f1.part
